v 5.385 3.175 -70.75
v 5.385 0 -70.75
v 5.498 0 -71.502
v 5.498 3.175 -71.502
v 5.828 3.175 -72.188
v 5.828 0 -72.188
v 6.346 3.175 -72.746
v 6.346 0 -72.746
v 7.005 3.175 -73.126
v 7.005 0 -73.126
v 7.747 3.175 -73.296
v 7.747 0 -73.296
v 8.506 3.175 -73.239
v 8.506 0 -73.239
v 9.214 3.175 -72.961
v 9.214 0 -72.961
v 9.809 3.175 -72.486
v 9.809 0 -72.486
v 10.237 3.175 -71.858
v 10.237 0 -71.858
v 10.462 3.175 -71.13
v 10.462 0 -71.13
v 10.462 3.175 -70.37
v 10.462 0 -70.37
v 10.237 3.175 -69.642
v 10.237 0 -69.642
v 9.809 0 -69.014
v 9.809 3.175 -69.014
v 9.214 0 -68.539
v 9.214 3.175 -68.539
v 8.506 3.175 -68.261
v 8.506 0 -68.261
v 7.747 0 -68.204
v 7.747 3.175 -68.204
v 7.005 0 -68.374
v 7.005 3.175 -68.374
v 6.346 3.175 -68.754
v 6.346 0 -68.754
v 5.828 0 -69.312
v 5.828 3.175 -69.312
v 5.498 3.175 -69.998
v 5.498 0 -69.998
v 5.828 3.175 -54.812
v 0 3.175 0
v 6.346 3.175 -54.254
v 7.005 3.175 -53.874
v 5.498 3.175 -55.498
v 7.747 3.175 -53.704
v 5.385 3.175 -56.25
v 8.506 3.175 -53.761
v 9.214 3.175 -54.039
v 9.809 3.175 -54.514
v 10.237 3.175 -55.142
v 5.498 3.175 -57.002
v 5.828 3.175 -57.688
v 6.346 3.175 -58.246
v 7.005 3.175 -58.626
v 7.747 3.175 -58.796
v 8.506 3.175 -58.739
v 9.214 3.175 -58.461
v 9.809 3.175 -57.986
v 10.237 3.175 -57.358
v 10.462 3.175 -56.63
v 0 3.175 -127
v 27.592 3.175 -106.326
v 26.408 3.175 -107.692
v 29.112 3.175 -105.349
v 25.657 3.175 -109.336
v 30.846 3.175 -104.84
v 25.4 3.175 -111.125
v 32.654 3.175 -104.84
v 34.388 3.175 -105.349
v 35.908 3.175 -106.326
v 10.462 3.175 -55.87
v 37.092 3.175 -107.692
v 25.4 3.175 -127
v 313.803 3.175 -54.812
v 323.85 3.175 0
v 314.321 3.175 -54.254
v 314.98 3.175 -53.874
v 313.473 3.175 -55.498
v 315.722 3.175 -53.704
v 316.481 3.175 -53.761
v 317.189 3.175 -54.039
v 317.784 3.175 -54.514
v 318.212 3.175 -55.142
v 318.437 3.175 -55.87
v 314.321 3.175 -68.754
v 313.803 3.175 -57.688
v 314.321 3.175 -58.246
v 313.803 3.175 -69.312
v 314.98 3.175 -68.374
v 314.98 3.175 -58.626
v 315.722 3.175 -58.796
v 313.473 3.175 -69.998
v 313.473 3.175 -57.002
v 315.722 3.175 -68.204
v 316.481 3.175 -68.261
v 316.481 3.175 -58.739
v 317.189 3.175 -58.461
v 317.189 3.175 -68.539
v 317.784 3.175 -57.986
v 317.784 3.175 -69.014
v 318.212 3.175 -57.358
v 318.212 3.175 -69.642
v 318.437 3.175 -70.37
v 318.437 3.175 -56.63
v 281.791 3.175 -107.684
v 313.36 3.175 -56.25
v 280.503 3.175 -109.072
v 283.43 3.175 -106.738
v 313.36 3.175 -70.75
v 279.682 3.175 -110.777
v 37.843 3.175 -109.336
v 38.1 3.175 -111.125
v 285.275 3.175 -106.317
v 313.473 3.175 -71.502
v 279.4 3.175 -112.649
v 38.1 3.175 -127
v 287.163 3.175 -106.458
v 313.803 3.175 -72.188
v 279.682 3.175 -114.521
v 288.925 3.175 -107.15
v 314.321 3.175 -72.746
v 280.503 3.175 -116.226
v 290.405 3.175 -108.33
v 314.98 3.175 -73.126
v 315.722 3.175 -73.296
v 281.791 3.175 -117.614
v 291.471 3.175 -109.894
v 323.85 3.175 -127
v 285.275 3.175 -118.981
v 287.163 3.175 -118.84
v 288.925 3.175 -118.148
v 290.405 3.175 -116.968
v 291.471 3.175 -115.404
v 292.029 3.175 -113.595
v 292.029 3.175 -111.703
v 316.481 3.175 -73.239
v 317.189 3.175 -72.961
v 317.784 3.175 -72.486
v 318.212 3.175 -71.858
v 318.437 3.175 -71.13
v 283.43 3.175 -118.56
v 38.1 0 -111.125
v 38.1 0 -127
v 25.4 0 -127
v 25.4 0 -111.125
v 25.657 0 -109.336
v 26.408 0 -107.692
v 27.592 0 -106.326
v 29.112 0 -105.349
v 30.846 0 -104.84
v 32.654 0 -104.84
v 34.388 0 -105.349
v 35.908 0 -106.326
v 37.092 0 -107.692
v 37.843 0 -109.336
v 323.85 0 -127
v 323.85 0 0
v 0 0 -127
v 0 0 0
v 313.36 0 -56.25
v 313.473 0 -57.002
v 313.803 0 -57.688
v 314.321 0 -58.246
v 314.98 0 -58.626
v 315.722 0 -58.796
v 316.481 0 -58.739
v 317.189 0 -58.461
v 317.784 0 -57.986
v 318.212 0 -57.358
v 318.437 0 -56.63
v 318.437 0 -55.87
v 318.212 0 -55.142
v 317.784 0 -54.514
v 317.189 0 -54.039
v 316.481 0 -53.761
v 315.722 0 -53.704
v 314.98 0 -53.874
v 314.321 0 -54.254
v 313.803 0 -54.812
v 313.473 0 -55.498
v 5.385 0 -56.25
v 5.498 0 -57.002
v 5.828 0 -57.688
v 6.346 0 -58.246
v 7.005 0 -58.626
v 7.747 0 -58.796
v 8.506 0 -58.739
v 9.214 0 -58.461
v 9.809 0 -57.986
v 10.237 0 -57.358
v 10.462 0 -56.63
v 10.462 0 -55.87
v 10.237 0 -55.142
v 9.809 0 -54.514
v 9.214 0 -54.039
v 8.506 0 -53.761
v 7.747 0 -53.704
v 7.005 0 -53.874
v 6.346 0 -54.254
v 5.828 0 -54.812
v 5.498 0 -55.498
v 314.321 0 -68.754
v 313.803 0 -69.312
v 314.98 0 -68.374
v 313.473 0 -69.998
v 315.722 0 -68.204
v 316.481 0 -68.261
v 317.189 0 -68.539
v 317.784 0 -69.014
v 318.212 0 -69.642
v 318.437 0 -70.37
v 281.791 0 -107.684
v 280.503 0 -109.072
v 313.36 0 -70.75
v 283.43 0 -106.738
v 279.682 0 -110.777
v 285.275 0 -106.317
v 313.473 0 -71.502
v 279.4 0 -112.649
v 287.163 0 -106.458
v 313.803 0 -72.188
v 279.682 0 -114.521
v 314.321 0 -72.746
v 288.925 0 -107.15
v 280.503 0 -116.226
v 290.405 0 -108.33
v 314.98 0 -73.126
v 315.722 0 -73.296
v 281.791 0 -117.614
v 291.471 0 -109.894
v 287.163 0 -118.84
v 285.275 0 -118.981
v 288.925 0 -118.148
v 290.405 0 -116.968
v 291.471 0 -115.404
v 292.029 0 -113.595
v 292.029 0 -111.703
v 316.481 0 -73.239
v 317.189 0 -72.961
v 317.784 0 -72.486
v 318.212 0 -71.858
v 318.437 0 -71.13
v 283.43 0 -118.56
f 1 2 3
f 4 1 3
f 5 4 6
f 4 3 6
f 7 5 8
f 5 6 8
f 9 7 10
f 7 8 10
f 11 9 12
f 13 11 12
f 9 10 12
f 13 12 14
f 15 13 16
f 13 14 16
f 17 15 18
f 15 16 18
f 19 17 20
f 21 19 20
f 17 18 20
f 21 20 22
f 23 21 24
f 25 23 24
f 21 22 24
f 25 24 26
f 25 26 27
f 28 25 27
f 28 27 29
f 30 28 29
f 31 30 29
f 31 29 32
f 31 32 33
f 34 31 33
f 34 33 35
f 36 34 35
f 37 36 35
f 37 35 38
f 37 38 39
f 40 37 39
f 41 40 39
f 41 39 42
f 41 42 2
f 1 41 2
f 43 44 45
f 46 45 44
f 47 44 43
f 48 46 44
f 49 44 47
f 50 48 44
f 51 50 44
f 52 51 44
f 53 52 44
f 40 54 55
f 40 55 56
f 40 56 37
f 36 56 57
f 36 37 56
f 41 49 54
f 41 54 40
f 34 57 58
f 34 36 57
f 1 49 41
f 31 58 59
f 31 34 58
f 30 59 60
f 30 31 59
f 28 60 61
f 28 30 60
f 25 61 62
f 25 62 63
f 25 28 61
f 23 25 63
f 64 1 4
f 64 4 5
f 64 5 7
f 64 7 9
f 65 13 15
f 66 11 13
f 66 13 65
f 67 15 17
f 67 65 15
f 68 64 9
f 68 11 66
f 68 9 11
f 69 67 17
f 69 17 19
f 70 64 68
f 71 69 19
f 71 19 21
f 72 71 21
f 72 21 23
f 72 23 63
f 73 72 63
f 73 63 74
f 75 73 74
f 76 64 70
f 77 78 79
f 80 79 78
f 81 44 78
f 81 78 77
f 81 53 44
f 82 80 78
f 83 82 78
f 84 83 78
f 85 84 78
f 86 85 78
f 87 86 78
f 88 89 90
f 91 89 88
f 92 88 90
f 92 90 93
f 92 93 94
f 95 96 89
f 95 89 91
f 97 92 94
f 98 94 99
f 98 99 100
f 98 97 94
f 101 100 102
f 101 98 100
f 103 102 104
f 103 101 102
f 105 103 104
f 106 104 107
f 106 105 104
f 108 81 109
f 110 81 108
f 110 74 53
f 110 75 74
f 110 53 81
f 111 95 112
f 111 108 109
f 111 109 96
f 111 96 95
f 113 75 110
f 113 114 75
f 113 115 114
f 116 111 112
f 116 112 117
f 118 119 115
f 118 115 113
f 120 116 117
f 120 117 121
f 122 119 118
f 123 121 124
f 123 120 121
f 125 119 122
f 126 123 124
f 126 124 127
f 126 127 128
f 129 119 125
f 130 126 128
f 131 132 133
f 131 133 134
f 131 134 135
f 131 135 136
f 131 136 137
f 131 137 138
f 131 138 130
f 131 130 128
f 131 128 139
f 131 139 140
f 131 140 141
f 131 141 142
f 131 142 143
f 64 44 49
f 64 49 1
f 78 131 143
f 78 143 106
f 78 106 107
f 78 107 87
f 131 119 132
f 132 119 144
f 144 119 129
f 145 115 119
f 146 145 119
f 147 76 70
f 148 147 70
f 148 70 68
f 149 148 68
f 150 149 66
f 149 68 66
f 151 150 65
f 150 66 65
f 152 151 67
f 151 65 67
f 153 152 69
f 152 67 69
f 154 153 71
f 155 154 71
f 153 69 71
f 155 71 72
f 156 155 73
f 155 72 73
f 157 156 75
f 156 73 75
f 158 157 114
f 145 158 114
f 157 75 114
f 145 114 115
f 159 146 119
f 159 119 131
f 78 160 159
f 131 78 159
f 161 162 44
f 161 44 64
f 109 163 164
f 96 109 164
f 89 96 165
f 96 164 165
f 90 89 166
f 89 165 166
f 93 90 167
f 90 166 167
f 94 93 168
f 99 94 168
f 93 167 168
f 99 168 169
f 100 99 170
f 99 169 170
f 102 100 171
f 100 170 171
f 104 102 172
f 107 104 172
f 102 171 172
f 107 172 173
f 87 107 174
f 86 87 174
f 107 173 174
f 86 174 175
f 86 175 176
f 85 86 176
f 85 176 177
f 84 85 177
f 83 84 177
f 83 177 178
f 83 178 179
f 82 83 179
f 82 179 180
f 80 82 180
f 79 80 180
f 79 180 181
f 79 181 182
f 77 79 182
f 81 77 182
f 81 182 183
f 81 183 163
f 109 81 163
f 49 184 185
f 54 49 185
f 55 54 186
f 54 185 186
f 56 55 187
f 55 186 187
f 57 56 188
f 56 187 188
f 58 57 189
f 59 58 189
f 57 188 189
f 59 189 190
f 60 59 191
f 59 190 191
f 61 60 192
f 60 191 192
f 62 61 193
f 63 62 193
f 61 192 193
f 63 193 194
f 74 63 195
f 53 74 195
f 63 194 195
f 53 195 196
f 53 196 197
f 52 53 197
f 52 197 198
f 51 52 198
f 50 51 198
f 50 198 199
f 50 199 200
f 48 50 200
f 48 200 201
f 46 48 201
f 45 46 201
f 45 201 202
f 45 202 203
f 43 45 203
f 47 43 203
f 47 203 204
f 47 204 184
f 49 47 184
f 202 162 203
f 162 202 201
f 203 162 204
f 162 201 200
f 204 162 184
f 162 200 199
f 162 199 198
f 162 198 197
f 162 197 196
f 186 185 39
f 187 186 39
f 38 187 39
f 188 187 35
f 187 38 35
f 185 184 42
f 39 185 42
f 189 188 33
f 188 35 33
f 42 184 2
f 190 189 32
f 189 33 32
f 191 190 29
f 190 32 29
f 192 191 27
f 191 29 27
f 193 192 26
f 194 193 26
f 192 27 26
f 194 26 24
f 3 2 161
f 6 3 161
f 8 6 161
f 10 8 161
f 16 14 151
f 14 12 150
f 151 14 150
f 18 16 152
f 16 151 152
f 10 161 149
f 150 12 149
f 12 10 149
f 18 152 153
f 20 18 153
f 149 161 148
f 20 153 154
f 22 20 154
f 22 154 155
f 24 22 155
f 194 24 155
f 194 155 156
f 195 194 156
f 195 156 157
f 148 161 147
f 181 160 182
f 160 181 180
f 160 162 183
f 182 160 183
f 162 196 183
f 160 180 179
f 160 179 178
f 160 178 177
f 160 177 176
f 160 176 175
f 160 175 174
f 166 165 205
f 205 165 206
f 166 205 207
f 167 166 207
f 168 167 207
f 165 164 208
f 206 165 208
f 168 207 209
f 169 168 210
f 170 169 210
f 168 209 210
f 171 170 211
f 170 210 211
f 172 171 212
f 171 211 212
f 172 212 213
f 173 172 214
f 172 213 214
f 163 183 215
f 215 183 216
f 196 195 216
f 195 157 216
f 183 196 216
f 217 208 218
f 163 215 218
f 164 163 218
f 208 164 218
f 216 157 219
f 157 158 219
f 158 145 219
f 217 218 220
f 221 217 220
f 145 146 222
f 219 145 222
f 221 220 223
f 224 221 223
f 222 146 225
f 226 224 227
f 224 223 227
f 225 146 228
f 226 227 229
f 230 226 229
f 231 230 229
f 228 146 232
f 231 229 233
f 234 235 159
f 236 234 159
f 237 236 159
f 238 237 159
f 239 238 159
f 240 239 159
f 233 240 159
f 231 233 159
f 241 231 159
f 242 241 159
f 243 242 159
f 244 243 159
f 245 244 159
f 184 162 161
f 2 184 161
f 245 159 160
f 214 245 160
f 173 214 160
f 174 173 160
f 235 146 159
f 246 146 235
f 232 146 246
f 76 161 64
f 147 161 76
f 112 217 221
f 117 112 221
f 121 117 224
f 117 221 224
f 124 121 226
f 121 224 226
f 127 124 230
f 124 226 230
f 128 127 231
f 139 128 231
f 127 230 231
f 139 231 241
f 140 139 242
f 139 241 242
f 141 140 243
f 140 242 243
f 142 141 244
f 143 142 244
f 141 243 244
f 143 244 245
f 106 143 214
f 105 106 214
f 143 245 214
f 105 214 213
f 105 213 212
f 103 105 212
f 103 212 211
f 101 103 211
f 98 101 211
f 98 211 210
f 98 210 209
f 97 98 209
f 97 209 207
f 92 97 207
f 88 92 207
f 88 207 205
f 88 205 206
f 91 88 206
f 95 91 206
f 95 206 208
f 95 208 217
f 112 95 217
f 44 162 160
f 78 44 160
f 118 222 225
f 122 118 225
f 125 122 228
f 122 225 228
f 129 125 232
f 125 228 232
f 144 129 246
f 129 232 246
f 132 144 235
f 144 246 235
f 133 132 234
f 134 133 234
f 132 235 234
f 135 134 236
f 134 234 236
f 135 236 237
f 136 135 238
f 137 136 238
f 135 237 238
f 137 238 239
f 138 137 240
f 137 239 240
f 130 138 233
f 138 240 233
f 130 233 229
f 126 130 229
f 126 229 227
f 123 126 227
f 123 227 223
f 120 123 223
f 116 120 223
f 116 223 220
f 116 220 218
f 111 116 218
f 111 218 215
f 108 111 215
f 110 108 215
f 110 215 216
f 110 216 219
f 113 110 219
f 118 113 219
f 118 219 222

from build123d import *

# Parameters (mm, degrees)
SKETCH1_W              = 323.85
SKETCH1_H              = 127
BOSS_EXTRUDE1_DEPTH    = 3.175
CUT_EXTRUDE1_DEPTH     = 4.175
SKETCH3_R              = 6.35
CUT_EXTRUDE2_DEPTH     = 58.15
F_10_CLEARANCE_HOLE1_D = 5.1054


with BuildPart() as part:
    # Sketch1 → Boss-Extrude1 (new body)
    with BuildSketch(Plane(origin=(0, 0, 0), x_dir=(1, 0, 0), z_dir=(0, 1, 0))):
        with Locations((161.925, 63.5)):
            Rectangle(SKETCH1_W, SKETCH1_H)
    extrude(amount=BOSS_EXTRUDE1_DEPTH)

    # Sketch2 → Cut-Extrude1 (cut, through all)
    with BuildSketch(Plane(origin=(0, 3.175, 0), x_dir=(1, 0, 0), z_dir=(0, 1, 0))):
        with BuildLine():
            Line((25.4, 127), (25.4, 111.125))
            ThreePointArc((25.4, 111.125), (31.75, 104.775), (38.1, 111.125))
            Line((38.1, 111.125), (38.1, 127))
            Line((38.1, 127), (25.4, 127))
        make_face()
    extrude(amount=-CUT_EXTRUDE1_DEPTH, mode=Mode.SUBTRACT)

    # Sketch3 → Cut-Extrude2 (cut, through all)
    with BuildSketch(Plane(origin=(0, -53.975, 0), x_dir=(-1, 0, 0), z_dir=(0, -1, 0))):
        with Locations((-285.75, 112.649)):
            Circle(SKETCH3_R)
    extrude(amount=-CUT_EXTRUDE2_DEPTH, mode=Mode.SUBTRACT)

    # #10 Clearance Hole1 (through all)
    with Locations(Plane(origin=(0, 3.175, 0), x_dir=(1, 0, 0), z_dir=(0, 1, 0))):
        with Locations((315.9125, 56.25), (315.9125, 70.75), (7.9375, 56.25), (7.9375, 70.75)):
            Hole(F_10_CLEARANCE_HOLE1_D / 2)


solid = part.part
